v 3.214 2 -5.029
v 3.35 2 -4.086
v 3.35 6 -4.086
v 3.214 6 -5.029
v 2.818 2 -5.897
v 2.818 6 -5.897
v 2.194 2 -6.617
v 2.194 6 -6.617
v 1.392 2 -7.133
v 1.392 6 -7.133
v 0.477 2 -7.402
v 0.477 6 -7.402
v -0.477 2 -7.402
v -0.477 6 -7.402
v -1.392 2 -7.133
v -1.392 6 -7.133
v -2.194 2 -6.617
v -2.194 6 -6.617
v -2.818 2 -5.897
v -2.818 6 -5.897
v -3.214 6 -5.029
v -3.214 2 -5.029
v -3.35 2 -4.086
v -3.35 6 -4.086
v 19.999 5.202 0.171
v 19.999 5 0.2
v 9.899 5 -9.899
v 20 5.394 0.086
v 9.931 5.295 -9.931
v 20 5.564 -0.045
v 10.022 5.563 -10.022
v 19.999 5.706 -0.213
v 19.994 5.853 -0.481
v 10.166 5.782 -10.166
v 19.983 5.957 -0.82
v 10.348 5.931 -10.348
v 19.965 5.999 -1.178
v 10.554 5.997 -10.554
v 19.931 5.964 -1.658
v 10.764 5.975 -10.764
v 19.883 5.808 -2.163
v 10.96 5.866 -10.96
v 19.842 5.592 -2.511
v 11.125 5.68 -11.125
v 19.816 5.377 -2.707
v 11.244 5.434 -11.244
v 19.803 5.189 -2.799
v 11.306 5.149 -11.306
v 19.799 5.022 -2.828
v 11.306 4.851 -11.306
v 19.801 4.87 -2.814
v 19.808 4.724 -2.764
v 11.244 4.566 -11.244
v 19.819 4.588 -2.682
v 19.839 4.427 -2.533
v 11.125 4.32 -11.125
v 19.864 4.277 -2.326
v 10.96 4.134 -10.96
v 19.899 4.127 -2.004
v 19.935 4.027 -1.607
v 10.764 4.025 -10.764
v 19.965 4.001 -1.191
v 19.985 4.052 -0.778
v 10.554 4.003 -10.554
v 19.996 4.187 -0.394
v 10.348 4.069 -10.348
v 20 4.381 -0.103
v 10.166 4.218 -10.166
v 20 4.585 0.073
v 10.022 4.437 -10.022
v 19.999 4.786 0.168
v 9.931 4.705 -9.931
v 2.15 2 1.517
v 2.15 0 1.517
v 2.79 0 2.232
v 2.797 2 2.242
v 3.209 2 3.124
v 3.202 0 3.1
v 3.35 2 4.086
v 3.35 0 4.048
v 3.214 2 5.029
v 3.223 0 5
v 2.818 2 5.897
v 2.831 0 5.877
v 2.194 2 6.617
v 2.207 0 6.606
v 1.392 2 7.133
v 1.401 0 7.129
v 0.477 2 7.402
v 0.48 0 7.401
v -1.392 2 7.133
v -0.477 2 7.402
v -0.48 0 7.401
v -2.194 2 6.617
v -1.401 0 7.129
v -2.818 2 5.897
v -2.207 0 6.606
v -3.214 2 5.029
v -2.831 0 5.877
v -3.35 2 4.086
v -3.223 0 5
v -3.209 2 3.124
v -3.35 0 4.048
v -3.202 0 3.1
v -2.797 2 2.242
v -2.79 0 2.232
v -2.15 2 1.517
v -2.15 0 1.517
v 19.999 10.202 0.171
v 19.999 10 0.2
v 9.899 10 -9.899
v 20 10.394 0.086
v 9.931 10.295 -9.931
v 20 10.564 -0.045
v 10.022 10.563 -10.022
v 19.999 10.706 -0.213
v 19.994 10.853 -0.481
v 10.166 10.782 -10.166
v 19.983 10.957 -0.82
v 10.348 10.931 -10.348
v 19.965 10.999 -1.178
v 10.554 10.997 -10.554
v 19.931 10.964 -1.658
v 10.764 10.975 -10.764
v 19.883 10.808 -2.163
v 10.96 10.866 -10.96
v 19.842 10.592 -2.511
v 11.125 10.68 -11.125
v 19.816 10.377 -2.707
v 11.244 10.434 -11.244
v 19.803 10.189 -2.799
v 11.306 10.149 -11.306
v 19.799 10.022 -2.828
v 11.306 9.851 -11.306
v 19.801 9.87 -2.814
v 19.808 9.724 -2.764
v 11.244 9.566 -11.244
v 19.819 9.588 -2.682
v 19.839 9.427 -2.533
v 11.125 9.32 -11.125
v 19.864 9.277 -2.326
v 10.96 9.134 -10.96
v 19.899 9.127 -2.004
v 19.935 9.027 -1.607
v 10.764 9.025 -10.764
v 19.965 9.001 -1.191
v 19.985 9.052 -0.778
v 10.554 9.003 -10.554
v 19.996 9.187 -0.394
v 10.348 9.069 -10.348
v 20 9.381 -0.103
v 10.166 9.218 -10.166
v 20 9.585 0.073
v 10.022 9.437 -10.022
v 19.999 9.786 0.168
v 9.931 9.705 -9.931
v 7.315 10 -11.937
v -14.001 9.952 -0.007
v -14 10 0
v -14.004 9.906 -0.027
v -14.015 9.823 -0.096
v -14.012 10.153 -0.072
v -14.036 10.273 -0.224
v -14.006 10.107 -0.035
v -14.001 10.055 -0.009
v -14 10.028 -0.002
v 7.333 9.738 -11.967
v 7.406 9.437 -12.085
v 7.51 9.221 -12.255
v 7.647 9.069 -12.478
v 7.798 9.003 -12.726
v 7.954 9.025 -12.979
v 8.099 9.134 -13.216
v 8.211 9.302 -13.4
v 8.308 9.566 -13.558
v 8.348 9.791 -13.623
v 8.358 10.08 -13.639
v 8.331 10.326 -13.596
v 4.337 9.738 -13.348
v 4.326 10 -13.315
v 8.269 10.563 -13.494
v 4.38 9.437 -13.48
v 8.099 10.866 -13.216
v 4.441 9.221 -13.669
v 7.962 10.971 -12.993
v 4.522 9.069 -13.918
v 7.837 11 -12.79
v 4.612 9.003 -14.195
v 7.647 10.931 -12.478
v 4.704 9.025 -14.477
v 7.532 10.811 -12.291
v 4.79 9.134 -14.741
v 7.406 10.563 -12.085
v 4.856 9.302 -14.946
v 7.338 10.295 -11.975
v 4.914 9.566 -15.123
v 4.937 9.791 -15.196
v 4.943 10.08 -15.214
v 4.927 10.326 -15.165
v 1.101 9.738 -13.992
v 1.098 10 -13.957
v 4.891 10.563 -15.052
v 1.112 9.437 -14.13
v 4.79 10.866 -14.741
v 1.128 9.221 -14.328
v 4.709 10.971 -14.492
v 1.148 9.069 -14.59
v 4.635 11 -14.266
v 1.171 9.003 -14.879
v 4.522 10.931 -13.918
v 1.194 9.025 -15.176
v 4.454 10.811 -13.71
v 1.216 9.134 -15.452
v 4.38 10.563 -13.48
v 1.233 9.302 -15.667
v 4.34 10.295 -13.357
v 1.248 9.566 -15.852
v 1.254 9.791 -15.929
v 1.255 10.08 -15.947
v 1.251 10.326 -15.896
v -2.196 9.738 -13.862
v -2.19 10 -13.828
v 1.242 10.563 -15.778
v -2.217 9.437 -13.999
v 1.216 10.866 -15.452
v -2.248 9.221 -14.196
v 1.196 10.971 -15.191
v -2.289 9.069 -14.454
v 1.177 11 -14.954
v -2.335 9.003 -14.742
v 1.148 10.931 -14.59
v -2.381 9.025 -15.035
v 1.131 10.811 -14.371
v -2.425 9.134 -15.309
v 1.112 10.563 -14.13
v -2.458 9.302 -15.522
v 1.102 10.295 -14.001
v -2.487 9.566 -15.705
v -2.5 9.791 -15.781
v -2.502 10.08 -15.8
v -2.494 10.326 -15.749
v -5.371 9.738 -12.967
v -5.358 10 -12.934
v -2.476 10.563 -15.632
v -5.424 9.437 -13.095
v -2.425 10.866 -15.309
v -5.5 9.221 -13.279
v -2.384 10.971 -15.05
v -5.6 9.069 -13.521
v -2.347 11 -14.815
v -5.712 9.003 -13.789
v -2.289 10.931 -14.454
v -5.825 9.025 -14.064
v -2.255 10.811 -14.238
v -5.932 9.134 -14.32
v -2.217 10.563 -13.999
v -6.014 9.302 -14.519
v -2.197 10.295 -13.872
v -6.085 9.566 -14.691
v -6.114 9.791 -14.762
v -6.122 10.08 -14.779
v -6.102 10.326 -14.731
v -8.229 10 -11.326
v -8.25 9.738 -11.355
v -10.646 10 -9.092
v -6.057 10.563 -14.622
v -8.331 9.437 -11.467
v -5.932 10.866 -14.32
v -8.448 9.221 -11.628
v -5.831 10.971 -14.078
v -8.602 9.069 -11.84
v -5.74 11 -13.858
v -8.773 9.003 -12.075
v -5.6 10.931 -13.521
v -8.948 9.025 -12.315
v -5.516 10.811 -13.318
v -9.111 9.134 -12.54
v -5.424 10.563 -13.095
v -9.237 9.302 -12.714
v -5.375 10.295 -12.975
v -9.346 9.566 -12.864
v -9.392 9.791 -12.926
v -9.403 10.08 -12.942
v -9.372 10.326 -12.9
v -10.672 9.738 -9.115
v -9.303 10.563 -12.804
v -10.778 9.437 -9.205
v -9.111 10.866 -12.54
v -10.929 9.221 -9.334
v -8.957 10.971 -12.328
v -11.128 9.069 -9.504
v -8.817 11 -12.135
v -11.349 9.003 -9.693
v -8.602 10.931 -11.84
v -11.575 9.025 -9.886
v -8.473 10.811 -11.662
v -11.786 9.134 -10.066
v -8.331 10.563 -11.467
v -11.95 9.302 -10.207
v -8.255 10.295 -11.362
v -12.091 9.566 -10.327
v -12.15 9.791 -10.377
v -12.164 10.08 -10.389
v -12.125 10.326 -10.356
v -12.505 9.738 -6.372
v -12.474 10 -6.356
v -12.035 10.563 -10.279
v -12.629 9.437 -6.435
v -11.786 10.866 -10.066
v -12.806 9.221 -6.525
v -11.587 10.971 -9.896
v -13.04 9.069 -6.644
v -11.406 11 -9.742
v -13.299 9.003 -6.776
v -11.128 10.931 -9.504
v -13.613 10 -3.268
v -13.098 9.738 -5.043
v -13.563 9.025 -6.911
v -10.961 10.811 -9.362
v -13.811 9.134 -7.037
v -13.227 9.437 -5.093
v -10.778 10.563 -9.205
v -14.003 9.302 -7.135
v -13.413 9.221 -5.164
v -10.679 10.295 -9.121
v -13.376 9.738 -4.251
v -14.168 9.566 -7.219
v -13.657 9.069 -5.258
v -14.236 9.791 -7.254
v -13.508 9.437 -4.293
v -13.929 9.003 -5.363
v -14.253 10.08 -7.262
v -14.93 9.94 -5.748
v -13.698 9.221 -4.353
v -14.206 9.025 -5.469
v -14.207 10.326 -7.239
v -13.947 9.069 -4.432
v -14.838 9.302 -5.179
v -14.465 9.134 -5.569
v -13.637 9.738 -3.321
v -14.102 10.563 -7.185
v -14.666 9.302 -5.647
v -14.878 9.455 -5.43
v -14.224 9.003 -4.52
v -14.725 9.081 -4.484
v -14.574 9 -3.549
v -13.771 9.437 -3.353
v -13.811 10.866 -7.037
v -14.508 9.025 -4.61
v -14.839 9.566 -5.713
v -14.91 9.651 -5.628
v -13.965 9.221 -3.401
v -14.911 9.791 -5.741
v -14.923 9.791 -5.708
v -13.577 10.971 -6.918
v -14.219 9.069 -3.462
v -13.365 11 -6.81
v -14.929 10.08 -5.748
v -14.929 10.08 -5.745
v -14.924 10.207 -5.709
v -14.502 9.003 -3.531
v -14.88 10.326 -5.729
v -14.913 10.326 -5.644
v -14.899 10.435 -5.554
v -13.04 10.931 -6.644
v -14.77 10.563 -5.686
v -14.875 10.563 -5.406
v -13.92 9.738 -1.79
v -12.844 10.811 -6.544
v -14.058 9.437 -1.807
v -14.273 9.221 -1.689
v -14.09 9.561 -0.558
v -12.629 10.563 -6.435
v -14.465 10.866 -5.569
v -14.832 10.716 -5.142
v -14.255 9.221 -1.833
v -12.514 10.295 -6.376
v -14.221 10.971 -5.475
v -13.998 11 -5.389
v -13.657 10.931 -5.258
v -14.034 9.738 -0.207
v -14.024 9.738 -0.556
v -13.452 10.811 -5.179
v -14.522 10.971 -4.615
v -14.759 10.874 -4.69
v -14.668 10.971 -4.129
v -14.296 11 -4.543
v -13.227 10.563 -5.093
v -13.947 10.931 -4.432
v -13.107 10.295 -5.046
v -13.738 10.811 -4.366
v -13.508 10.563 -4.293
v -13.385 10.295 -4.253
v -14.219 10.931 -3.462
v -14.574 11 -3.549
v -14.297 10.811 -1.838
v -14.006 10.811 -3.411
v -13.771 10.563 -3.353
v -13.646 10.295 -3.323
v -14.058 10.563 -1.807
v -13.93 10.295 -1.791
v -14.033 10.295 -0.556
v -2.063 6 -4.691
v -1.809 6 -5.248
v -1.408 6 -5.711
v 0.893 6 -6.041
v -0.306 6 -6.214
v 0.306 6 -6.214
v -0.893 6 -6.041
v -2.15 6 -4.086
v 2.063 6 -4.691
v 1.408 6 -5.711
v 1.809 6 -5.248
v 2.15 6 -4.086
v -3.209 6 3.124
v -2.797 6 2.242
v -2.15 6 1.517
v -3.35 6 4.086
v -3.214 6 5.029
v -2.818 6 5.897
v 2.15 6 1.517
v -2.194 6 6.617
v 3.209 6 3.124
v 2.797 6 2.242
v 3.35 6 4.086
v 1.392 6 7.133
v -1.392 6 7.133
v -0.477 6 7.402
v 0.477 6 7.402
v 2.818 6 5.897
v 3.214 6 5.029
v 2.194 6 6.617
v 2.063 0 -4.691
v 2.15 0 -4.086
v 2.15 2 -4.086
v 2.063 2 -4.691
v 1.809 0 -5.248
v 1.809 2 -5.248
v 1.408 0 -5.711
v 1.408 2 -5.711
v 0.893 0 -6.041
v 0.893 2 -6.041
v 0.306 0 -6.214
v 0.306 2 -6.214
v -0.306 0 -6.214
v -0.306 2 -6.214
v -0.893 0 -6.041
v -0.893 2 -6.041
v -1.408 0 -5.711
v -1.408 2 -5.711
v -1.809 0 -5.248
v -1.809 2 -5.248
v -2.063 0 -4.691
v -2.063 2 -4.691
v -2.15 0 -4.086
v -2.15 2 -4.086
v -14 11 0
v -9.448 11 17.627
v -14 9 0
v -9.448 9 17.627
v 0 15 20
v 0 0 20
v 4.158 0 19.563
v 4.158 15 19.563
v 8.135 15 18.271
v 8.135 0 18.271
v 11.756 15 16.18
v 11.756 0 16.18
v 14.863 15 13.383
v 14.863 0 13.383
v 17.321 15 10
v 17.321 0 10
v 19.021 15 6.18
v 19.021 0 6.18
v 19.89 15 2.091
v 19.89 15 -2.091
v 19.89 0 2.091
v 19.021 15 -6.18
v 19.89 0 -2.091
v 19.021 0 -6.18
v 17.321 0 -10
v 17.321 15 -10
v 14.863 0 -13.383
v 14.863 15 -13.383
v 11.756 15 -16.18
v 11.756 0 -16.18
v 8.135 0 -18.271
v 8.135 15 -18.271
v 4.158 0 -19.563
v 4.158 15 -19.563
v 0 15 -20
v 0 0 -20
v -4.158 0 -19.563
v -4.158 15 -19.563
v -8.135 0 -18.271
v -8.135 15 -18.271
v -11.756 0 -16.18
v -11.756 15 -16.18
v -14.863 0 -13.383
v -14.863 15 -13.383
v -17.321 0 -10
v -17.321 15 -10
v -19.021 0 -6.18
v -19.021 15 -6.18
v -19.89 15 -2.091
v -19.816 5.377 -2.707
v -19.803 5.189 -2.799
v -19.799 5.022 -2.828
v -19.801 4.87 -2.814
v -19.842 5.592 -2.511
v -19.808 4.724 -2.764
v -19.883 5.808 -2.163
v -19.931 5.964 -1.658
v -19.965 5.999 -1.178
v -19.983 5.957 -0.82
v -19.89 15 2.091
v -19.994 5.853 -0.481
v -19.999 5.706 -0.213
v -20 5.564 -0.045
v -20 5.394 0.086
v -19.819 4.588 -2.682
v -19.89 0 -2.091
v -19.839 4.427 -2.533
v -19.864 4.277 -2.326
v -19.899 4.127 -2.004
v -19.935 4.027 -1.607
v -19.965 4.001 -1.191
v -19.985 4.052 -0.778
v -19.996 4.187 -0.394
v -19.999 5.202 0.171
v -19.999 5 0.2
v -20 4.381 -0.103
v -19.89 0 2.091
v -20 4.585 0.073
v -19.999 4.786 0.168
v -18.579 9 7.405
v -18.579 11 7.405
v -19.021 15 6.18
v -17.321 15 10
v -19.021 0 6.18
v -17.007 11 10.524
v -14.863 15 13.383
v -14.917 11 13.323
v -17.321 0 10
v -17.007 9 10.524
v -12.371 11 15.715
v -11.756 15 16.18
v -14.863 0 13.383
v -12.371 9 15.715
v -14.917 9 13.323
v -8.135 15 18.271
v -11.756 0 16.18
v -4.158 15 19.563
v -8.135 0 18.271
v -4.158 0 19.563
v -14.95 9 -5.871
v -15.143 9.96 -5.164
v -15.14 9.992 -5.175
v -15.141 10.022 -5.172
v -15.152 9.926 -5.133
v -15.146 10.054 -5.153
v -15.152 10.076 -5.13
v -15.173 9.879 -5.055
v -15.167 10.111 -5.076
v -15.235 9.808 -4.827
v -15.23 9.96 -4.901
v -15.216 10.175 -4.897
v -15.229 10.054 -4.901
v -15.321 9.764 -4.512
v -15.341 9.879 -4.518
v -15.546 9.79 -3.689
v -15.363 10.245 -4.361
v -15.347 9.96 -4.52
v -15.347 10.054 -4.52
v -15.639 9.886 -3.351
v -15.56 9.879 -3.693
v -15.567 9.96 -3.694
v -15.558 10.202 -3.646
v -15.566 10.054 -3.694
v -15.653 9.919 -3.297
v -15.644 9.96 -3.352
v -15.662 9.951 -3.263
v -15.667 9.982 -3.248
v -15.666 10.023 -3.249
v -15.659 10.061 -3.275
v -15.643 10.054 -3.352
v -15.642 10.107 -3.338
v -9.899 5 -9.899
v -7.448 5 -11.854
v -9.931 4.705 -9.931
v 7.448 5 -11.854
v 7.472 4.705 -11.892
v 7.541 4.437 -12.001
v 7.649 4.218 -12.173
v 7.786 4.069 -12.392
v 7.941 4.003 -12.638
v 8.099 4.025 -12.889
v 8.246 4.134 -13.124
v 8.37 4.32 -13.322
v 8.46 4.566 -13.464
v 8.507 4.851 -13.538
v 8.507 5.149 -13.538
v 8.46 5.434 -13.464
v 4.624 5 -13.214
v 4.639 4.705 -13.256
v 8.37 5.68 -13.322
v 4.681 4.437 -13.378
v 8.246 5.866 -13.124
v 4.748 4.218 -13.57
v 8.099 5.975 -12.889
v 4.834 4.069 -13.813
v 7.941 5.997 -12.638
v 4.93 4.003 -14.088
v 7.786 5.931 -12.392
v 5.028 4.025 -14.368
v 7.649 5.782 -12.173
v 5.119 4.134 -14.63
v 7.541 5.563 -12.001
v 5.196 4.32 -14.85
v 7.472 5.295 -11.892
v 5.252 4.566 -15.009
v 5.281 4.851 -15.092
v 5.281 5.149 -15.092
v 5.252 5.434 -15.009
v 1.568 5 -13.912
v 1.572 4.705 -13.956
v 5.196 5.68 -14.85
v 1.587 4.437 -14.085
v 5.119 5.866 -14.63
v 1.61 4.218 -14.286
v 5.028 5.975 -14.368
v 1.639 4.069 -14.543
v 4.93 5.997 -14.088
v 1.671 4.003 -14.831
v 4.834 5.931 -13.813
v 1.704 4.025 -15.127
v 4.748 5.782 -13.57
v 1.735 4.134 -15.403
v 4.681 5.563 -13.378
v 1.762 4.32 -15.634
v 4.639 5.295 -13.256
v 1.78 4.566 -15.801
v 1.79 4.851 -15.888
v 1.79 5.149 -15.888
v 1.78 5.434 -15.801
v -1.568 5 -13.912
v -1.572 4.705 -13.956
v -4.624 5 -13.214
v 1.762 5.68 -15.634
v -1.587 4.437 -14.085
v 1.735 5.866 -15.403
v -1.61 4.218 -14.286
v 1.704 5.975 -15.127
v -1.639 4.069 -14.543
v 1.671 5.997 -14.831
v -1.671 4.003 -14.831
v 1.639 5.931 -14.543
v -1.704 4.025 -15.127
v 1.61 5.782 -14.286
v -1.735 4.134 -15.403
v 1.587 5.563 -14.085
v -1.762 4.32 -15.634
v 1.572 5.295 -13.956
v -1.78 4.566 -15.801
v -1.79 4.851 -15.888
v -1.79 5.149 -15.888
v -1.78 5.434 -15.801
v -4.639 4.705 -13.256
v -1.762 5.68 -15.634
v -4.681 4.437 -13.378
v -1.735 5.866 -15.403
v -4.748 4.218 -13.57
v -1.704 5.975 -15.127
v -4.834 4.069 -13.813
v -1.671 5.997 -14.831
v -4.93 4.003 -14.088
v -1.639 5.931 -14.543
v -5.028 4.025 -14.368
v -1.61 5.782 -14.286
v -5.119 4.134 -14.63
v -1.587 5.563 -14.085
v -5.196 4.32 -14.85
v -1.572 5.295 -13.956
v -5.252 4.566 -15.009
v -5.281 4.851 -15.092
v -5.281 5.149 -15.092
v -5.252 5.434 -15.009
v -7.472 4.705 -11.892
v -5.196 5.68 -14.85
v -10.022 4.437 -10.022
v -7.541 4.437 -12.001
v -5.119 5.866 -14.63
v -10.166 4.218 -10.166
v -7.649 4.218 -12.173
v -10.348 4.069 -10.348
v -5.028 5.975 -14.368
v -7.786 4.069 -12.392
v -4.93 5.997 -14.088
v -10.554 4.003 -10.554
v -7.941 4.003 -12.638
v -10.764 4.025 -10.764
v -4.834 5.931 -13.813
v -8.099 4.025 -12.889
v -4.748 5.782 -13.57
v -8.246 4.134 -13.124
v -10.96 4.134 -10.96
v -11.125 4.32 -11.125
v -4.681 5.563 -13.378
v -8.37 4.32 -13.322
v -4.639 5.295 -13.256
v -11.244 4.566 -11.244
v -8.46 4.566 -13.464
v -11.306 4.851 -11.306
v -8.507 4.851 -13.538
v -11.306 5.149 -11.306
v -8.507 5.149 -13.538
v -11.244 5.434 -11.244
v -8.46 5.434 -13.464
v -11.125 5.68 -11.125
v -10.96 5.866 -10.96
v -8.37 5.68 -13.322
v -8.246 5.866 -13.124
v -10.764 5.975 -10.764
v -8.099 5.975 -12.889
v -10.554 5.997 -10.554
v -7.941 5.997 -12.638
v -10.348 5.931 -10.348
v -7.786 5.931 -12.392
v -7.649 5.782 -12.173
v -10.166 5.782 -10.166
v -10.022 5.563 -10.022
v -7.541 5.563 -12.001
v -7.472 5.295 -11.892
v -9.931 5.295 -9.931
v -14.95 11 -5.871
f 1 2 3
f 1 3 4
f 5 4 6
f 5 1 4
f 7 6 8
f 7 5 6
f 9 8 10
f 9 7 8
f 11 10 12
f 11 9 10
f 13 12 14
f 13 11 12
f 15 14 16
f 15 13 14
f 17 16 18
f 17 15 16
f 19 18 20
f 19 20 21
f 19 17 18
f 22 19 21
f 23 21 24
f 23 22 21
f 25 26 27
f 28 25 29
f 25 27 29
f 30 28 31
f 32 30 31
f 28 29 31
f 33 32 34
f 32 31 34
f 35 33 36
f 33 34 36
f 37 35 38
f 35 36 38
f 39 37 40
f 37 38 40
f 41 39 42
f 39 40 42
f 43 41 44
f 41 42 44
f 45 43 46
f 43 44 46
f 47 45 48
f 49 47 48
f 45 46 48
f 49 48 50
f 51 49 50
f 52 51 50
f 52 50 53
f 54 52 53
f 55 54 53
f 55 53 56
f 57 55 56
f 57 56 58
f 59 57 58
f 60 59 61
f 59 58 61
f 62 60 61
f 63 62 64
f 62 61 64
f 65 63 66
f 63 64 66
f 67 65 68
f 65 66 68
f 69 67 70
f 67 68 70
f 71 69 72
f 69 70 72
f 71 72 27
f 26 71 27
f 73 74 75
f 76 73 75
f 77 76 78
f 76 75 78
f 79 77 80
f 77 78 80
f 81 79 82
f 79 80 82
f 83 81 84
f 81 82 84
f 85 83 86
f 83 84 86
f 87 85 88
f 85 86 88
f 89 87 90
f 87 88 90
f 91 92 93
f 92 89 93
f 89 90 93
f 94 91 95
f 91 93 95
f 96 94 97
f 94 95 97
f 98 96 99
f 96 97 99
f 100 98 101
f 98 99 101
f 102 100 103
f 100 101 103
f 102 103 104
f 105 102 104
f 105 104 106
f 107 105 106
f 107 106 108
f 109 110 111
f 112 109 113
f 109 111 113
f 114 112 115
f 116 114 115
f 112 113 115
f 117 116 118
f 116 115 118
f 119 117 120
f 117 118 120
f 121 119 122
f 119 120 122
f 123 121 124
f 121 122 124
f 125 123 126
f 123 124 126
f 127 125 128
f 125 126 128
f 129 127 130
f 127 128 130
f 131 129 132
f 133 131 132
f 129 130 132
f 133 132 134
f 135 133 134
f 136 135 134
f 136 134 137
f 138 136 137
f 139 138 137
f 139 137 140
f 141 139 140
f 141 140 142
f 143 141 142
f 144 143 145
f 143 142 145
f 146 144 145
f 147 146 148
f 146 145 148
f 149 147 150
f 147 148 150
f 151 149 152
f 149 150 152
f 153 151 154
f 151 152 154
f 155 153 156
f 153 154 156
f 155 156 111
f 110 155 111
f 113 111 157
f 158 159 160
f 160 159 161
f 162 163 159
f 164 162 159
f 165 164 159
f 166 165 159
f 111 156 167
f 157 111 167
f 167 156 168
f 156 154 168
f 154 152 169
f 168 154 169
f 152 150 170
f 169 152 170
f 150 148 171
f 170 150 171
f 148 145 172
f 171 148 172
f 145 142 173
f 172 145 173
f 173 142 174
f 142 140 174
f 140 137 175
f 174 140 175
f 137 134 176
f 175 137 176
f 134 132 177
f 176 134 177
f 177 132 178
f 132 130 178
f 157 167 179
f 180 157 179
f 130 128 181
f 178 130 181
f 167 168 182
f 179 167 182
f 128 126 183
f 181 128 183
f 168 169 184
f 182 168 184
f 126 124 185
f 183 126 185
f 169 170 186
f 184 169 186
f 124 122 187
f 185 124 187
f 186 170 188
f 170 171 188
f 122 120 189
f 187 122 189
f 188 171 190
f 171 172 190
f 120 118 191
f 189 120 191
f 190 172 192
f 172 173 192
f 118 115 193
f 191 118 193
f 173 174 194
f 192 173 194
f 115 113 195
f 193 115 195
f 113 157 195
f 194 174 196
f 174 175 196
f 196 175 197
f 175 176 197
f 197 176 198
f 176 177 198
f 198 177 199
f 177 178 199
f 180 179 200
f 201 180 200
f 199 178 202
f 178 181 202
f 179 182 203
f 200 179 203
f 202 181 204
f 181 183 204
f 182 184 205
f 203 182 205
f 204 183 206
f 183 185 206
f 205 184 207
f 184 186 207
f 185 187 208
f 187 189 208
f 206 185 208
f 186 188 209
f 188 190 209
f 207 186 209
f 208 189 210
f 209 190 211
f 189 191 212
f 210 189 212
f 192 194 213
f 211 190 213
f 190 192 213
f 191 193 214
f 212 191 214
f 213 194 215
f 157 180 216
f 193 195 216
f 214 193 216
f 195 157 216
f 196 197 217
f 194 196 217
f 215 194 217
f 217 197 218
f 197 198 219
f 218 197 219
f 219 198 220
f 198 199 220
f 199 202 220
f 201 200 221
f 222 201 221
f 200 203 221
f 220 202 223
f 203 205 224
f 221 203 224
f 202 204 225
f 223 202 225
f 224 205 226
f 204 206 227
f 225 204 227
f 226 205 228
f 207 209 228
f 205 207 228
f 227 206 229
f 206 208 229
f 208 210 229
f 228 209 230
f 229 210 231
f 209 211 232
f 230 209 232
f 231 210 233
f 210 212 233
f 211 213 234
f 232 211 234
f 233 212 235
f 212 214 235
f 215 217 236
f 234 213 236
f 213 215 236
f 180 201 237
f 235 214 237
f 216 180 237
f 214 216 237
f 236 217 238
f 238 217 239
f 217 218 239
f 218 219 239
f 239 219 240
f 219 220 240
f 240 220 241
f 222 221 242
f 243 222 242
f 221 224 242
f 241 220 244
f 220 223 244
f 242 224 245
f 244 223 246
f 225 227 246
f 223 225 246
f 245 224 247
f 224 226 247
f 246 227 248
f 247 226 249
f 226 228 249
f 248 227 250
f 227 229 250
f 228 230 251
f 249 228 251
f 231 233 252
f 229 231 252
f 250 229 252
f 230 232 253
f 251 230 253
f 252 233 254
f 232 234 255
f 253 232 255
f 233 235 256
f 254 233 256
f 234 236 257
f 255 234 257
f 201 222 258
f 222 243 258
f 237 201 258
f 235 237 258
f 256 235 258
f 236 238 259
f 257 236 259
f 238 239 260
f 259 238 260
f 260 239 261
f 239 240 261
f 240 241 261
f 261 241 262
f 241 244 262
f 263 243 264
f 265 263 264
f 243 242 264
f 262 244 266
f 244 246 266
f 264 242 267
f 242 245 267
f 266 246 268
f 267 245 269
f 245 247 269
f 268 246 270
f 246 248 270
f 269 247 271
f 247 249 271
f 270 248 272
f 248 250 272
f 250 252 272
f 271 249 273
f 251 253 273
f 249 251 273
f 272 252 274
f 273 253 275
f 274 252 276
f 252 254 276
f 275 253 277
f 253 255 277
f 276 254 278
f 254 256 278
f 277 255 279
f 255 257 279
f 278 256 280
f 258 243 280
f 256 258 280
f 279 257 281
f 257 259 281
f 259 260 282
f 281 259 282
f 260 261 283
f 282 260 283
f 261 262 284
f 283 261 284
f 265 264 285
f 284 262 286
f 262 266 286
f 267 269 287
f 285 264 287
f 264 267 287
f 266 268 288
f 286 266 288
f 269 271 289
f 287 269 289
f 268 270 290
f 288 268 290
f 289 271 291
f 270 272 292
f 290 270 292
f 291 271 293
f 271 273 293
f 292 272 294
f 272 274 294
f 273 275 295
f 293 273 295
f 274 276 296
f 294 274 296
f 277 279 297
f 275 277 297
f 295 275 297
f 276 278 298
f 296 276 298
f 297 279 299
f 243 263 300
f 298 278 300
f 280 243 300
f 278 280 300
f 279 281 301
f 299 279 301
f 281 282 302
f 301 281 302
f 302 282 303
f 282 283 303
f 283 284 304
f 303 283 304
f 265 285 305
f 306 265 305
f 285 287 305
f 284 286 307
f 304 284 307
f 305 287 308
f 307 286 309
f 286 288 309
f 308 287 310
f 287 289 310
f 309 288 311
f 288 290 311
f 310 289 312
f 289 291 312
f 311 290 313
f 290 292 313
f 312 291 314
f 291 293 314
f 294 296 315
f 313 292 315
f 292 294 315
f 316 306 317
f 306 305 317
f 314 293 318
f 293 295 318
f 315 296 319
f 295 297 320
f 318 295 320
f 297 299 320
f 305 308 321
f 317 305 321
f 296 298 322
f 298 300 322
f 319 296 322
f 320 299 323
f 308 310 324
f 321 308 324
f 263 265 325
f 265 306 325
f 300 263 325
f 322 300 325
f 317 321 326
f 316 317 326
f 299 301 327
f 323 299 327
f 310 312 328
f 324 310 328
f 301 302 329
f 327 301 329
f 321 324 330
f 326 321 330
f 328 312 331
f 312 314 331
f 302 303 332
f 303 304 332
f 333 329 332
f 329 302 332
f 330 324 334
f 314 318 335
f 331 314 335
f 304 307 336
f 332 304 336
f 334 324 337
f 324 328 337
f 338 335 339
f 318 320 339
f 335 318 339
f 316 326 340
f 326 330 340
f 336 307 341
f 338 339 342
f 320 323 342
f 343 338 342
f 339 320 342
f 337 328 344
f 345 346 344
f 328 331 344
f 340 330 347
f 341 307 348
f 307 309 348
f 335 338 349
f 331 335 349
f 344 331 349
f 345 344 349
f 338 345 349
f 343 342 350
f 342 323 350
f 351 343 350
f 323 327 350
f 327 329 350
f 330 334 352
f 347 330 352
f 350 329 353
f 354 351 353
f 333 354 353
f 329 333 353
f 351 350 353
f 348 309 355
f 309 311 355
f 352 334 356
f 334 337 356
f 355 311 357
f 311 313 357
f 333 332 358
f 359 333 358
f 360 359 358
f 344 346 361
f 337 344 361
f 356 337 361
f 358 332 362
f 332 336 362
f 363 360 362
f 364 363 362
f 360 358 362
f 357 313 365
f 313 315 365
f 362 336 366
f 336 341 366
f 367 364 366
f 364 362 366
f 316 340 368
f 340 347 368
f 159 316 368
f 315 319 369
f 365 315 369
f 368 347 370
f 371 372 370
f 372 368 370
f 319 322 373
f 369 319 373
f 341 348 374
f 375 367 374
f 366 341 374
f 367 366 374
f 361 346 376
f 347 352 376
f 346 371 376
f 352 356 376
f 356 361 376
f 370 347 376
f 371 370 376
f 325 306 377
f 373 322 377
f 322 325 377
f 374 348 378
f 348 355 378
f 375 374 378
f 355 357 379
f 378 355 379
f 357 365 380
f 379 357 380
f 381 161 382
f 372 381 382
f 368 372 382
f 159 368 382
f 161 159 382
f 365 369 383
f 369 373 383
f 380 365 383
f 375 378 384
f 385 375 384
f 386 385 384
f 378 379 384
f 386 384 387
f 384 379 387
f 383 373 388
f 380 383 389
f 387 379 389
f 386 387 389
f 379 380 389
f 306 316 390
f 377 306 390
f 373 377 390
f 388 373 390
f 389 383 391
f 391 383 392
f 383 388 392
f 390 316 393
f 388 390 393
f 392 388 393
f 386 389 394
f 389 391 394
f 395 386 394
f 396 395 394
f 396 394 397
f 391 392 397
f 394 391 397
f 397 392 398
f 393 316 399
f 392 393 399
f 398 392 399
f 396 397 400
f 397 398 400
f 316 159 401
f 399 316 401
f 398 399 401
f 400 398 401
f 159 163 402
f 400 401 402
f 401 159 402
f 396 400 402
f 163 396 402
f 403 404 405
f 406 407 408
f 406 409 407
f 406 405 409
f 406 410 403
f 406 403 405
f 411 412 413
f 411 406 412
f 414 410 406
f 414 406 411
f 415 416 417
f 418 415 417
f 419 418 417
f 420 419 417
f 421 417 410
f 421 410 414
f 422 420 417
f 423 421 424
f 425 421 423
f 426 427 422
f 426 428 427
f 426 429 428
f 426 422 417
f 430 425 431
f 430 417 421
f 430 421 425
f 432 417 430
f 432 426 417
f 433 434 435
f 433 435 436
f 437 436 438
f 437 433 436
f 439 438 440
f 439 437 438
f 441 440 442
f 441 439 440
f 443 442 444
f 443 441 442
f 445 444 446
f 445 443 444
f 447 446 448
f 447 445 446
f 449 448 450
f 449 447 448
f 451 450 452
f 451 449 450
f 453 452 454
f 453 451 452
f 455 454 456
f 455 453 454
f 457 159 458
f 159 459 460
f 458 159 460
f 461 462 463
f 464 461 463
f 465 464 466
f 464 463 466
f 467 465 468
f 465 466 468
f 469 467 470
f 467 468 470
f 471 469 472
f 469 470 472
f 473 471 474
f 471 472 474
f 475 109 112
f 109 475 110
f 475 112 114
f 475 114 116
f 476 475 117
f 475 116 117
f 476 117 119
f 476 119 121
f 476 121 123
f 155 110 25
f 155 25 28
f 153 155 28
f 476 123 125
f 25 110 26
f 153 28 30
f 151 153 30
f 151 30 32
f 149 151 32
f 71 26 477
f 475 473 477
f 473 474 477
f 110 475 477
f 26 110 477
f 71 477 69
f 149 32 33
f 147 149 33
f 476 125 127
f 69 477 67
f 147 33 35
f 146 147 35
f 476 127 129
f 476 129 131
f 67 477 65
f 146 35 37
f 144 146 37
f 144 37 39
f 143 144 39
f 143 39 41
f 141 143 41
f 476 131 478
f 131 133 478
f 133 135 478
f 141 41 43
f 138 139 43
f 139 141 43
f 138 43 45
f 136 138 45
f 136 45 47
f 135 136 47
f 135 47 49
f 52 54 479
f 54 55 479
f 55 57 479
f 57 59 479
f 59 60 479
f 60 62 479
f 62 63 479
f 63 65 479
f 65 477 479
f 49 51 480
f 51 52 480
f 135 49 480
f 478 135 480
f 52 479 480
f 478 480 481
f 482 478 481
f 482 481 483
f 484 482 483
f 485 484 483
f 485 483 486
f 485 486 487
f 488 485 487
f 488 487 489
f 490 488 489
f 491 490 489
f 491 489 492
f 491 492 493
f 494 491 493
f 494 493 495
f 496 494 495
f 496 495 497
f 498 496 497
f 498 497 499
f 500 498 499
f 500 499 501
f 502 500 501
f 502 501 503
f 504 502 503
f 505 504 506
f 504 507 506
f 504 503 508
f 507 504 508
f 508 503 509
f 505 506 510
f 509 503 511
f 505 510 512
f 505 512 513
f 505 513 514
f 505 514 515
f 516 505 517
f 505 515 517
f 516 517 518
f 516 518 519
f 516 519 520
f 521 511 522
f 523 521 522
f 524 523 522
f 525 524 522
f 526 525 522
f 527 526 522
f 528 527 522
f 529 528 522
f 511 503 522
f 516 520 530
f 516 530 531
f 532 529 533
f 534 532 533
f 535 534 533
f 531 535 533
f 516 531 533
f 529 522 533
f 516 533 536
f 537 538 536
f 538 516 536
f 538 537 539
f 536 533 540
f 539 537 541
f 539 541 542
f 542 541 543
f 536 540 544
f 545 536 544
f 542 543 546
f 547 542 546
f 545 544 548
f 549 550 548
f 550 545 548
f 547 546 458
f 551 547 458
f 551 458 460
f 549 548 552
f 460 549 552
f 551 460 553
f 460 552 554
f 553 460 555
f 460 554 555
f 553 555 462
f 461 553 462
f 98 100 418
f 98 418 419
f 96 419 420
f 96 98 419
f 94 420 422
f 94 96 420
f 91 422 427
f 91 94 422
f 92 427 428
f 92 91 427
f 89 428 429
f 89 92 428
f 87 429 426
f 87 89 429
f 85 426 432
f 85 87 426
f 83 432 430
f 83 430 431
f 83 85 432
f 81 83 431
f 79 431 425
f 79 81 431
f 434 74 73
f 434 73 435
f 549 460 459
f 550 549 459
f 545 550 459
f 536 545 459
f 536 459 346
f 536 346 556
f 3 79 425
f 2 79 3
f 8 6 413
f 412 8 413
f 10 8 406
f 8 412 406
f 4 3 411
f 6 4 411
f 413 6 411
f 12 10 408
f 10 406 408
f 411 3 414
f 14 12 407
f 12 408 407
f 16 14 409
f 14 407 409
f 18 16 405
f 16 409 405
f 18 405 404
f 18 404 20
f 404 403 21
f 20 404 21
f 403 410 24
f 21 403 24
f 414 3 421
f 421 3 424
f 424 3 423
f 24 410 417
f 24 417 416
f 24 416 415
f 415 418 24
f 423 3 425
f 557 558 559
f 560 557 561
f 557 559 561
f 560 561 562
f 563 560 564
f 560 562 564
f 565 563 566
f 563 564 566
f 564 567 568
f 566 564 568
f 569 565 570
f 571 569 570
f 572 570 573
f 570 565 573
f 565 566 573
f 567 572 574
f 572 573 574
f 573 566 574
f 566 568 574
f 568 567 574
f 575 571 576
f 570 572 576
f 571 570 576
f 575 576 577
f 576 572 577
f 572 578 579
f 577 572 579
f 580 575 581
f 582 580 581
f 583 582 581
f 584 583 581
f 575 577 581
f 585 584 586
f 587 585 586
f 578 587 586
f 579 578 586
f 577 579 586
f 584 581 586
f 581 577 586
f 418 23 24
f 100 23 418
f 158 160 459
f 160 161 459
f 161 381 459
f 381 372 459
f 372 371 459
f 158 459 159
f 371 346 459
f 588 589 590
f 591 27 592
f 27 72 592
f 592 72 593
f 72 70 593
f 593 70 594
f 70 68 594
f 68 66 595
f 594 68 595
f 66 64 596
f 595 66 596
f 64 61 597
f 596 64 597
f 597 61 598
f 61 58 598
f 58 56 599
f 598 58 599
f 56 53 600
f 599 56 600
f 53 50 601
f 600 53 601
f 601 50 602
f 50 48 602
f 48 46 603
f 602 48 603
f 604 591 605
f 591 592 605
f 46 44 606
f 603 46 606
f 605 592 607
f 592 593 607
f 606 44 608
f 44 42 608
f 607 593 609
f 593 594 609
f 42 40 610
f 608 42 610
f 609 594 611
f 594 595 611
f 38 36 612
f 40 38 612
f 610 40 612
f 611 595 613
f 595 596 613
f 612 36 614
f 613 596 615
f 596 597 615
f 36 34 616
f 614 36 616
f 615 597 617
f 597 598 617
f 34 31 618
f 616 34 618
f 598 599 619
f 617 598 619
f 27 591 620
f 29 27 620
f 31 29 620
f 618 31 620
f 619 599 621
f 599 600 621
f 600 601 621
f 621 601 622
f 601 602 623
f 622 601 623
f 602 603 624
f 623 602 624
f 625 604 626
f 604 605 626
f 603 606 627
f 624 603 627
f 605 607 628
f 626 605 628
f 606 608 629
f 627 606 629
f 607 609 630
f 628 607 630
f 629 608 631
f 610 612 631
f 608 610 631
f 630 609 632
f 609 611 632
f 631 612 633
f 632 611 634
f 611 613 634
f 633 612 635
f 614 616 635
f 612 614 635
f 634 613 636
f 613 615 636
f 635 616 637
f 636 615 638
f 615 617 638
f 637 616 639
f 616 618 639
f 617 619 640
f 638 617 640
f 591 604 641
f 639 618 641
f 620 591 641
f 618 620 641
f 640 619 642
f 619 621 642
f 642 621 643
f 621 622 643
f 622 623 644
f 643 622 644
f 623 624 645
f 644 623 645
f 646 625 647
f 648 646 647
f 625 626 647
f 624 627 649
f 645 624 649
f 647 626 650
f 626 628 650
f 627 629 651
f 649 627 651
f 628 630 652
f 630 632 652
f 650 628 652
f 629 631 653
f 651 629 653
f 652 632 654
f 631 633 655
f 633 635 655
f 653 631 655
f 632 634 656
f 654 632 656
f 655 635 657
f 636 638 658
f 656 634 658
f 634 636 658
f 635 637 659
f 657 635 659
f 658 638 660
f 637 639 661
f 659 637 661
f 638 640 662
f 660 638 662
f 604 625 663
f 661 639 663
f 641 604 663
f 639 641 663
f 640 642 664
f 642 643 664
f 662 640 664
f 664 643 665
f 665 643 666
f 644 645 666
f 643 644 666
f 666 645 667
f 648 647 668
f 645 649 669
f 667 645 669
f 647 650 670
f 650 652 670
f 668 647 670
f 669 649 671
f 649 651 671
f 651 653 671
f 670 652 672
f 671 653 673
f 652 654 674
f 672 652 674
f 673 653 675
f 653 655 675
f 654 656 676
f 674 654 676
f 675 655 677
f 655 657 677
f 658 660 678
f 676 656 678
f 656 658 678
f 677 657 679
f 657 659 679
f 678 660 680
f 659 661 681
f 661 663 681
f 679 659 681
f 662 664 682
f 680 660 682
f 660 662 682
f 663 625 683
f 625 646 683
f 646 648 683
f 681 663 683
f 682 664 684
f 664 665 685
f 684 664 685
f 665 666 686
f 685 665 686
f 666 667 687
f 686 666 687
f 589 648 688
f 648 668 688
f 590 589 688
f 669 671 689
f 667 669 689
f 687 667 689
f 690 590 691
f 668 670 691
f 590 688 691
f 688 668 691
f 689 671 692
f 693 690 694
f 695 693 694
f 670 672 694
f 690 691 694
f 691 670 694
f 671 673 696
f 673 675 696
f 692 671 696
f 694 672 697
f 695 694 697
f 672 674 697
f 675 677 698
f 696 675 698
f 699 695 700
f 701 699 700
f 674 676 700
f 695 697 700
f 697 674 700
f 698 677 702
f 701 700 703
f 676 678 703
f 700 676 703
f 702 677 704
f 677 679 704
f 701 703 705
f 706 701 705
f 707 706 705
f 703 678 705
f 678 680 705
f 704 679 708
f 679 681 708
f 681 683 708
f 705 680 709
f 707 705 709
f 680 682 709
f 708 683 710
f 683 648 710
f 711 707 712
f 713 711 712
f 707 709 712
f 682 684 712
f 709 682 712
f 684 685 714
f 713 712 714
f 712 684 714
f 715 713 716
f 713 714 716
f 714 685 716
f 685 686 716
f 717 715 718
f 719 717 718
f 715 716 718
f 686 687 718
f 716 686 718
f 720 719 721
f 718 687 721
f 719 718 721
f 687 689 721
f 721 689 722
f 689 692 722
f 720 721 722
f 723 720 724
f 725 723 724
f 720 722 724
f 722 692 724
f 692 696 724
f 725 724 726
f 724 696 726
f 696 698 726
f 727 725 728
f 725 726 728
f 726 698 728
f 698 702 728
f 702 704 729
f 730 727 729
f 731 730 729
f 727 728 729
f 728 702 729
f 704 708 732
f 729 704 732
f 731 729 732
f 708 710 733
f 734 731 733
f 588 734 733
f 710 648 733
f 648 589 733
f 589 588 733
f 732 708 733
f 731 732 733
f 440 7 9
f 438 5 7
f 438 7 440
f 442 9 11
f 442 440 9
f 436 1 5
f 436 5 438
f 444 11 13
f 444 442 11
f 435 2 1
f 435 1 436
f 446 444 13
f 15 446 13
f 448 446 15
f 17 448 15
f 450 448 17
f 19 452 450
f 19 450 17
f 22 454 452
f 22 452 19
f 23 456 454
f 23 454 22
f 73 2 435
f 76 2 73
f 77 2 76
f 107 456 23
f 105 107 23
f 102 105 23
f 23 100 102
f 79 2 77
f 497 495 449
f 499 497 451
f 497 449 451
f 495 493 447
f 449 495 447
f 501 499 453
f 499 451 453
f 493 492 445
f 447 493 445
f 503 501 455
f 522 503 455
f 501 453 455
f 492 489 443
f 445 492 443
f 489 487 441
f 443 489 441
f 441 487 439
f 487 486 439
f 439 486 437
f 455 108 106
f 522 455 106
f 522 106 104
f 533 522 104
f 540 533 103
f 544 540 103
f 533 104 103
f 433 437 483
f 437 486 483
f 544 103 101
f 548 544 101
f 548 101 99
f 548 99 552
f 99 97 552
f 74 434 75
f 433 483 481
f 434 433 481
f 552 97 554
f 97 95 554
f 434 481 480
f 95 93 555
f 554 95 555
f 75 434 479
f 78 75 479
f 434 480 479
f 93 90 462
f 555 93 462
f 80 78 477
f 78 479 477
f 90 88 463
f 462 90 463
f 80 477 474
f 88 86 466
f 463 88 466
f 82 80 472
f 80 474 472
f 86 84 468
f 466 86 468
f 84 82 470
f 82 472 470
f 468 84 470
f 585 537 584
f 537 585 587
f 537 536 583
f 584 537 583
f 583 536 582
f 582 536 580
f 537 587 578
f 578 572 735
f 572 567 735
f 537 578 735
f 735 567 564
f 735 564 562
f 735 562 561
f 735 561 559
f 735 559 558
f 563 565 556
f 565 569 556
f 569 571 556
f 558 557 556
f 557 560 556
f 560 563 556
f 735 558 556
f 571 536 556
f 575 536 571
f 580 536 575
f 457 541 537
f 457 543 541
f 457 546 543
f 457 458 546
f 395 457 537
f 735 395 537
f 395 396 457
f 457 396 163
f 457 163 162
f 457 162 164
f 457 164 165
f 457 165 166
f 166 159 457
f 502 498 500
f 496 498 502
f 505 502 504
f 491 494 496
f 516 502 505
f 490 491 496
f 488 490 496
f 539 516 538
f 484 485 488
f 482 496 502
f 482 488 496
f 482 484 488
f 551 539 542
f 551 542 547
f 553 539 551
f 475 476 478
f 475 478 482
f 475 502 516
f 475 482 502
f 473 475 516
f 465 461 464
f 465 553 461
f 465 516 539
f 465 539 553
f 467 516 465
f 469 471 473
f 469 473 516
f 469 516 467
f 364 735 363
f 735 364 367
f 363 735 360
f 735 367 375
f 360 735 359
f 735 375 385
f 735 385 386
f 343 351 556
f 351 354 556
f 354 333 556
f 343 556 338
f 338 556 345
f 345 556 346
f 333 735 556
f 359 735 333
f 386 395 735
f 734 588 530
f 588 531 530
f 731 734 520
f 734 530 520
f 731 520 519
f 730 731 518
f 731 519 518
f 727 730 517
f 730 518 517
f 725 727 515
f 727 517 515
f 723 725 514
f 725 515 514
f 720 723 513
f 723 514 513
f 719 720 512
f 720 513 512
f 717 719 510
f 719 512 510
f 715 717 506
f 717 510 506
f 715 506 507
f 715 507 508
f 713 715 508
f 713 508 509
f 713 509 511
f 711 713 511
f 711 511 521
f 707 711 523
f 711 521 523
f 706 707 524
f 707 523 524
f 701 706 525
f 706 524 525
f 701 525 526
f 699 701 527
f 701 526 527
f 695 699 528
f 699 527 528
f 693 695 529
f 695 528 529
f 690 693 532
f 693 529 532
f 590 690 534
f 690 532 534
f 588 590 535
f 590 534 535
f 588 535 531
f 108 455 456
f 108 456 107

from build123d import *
from build123d.topology import SkipClean

# Parameters (mm, degrees)
SKETCH1_R               = 20
BOSS_EXTRUDE1_DEPTH     = 15
CUT_EXTRUDE1_DEPTH      = 6
CUT_EXTRUDE2_START      = 4
CUT_EXTRUDE2_DEPTH      = 4
CUT_SWEEP1_PROFILE_R    = 1
CUT_SWEEP2_PROFILE_R    = 1
CUT_EXTRUDE3_DEPTH      = 1
CUT_EXTRUDE3_DEPTH_BACK = 1


with BuildPart() as part:
    # Sketch1 → Boss-Extrude1 (new body)
    with BuildSketch(Plane(origin=(0, 0, 0), x_dir=(1, 0, 0), z_dir=(0, 1, 0))):
        Circle(SKETCH1_R)
    extrude(amount=BOSS_EXTRUDE1_DEPTH)

    # Sketch2 → Cut-Extrude1 (cut)
    with BuildSketch(Plane.XZ):
        with BuildLine():
            Line((-2.15, 1.516637572), (-2.15, -4.085684088))
            ThreePointArc((-2.15, -4.085684088), (0, -6.235684088), (2.15, -4.085684088))
            Line((2.15, -4.085684088), (2.15, 1.516637572))
            ThreePointArc((2.15, 1.516637572), (0, 7.435684088), (-2.15, 1.516637572))
        make_face()
    extrude(amount=-CUT_EXTRUDE1_DEPTH, mode=Mode.SUBTRACT)

    # Sketch3 → Cut-Extrude2 (cut)
    with SkipClean():  # the faces are left unmerged after this step: merging them gives an invalid solid
        with BuildSketch(Plane.XZ.offset(-6).offset(CUT_EXTRUDE2_START)):
            with BuildLine():
                Line((-3.35, -4.085684088), (-3.35, 4.085684088))
                ThreePointArc((-3.35, 4.085684088), (0, 7.435684088), (3.35, 4.085684088))
                Line((3.35, 4.085684088), (3.35, -4.085684088))
                ThreePointArc((3.35, -4.085684088), (0, -7.435684088), (-3.35, -4.085684088))
            make_face()
        extrude(amount=-CUT_EXTRUDE2_DEPTH, mode=Mode.SUBTRACT)

    # Cut-Sweep1: sweep along a path in Sketch6
    with SkipClean():  # the faces are left unmerged after this step: merging them gives an invalid solid
        with BuildLine(Plane(origin=(0, 10, 0), x_dir=(1, 0, 0), z_dir=(0, 1, 0))) as cut_sweep1_path:
            Line((32.713303623, -11.500100188), (10.606601718, 10.606601718))
            ThreePointArc((10.606601718, 10.606601718), (-5.740251485, 13.858192988), (-15, 0))
            Line((-15, 0), (-15, -54.761265519))
        # Cut-Sweep1 profile (on start of the path) → Cut-Sweep1 (sweep, cut)
        with BuildSketch(Plane(origin=(32.713303623, 10, 11.500100188), x_dir=(-0.7071067811865515, 0, 0.7071067811865437), z_dir=(-0.7071067811865437, 0, -0.7071067811865515))):
            Circle(CUT_SWEEP1_PROFILE_R)
        sweep(path=cut_sweep1_path.line, mode=Mode.SUBTRACT)

    # Cut-Sweep2: sweep along a path in Sketch5
    with SkipClean():  # the faces are left unmerged after this step: merging them gives an invalid solid
        with BuildLine(Plane(origin=(0, 5, 0), x_dir=(-1, 0, 0), z_dir=(0, -1, 0))) as cut_sweep2_path:
            Line((-32.713303623, -11.500100188), (-10.606601718, 10.606601718))
            ThreePointArc((-10.606601718, 10.606601718), (0, 15), (10.606601718, 10.606601718))
            Line((10.606601718, 10.606601718), (41.577001277, -20.363797841))
        # Cut-Sweep2 profile (on start of the path) → Cut-Sweep2 (sweep, cut)
        with BuildSketch(Plane(origin=(32.713303623, 5, 11.500100188), x_dir=(-0.7071067811865515, 0, 0.7071067811865437), z_dir=(-0.7071067811865437, 0, -0.7071067811865515))):
            Circle(CUT_SWEEP2_PROFILE_R)
        sweep(path=cut_sweep2_path.line, mode=Mode.SUBTRACT)

    # Sketch19 → Cut-Extrude3 (cut, two sides: drawn at the far end of the back side and taken through both)
    with SkipClean():  # the faces are left unmerged after this step: merging them gives an invalid solid
        with BuildSketch(Plane(origin=(0, 10, 0), x_dir=(1, 0, 0), z_dir=(0, 1, 0)).offset(-CUT_EXTRUDE3_DEPTH_BACK)):
            Polygon((-14.949747468, 5.870733518), (-14, 0), (-8.665269788, -20.660460329), (-22.201970025, -20.660460329), align=None)
        extrude(amount=CUT_EXTRUDE3_DEPTH + CUT_EXTRUDE3_DEPTH_BACK, mode=Mode.SUBTRACT)


solid = part.part
